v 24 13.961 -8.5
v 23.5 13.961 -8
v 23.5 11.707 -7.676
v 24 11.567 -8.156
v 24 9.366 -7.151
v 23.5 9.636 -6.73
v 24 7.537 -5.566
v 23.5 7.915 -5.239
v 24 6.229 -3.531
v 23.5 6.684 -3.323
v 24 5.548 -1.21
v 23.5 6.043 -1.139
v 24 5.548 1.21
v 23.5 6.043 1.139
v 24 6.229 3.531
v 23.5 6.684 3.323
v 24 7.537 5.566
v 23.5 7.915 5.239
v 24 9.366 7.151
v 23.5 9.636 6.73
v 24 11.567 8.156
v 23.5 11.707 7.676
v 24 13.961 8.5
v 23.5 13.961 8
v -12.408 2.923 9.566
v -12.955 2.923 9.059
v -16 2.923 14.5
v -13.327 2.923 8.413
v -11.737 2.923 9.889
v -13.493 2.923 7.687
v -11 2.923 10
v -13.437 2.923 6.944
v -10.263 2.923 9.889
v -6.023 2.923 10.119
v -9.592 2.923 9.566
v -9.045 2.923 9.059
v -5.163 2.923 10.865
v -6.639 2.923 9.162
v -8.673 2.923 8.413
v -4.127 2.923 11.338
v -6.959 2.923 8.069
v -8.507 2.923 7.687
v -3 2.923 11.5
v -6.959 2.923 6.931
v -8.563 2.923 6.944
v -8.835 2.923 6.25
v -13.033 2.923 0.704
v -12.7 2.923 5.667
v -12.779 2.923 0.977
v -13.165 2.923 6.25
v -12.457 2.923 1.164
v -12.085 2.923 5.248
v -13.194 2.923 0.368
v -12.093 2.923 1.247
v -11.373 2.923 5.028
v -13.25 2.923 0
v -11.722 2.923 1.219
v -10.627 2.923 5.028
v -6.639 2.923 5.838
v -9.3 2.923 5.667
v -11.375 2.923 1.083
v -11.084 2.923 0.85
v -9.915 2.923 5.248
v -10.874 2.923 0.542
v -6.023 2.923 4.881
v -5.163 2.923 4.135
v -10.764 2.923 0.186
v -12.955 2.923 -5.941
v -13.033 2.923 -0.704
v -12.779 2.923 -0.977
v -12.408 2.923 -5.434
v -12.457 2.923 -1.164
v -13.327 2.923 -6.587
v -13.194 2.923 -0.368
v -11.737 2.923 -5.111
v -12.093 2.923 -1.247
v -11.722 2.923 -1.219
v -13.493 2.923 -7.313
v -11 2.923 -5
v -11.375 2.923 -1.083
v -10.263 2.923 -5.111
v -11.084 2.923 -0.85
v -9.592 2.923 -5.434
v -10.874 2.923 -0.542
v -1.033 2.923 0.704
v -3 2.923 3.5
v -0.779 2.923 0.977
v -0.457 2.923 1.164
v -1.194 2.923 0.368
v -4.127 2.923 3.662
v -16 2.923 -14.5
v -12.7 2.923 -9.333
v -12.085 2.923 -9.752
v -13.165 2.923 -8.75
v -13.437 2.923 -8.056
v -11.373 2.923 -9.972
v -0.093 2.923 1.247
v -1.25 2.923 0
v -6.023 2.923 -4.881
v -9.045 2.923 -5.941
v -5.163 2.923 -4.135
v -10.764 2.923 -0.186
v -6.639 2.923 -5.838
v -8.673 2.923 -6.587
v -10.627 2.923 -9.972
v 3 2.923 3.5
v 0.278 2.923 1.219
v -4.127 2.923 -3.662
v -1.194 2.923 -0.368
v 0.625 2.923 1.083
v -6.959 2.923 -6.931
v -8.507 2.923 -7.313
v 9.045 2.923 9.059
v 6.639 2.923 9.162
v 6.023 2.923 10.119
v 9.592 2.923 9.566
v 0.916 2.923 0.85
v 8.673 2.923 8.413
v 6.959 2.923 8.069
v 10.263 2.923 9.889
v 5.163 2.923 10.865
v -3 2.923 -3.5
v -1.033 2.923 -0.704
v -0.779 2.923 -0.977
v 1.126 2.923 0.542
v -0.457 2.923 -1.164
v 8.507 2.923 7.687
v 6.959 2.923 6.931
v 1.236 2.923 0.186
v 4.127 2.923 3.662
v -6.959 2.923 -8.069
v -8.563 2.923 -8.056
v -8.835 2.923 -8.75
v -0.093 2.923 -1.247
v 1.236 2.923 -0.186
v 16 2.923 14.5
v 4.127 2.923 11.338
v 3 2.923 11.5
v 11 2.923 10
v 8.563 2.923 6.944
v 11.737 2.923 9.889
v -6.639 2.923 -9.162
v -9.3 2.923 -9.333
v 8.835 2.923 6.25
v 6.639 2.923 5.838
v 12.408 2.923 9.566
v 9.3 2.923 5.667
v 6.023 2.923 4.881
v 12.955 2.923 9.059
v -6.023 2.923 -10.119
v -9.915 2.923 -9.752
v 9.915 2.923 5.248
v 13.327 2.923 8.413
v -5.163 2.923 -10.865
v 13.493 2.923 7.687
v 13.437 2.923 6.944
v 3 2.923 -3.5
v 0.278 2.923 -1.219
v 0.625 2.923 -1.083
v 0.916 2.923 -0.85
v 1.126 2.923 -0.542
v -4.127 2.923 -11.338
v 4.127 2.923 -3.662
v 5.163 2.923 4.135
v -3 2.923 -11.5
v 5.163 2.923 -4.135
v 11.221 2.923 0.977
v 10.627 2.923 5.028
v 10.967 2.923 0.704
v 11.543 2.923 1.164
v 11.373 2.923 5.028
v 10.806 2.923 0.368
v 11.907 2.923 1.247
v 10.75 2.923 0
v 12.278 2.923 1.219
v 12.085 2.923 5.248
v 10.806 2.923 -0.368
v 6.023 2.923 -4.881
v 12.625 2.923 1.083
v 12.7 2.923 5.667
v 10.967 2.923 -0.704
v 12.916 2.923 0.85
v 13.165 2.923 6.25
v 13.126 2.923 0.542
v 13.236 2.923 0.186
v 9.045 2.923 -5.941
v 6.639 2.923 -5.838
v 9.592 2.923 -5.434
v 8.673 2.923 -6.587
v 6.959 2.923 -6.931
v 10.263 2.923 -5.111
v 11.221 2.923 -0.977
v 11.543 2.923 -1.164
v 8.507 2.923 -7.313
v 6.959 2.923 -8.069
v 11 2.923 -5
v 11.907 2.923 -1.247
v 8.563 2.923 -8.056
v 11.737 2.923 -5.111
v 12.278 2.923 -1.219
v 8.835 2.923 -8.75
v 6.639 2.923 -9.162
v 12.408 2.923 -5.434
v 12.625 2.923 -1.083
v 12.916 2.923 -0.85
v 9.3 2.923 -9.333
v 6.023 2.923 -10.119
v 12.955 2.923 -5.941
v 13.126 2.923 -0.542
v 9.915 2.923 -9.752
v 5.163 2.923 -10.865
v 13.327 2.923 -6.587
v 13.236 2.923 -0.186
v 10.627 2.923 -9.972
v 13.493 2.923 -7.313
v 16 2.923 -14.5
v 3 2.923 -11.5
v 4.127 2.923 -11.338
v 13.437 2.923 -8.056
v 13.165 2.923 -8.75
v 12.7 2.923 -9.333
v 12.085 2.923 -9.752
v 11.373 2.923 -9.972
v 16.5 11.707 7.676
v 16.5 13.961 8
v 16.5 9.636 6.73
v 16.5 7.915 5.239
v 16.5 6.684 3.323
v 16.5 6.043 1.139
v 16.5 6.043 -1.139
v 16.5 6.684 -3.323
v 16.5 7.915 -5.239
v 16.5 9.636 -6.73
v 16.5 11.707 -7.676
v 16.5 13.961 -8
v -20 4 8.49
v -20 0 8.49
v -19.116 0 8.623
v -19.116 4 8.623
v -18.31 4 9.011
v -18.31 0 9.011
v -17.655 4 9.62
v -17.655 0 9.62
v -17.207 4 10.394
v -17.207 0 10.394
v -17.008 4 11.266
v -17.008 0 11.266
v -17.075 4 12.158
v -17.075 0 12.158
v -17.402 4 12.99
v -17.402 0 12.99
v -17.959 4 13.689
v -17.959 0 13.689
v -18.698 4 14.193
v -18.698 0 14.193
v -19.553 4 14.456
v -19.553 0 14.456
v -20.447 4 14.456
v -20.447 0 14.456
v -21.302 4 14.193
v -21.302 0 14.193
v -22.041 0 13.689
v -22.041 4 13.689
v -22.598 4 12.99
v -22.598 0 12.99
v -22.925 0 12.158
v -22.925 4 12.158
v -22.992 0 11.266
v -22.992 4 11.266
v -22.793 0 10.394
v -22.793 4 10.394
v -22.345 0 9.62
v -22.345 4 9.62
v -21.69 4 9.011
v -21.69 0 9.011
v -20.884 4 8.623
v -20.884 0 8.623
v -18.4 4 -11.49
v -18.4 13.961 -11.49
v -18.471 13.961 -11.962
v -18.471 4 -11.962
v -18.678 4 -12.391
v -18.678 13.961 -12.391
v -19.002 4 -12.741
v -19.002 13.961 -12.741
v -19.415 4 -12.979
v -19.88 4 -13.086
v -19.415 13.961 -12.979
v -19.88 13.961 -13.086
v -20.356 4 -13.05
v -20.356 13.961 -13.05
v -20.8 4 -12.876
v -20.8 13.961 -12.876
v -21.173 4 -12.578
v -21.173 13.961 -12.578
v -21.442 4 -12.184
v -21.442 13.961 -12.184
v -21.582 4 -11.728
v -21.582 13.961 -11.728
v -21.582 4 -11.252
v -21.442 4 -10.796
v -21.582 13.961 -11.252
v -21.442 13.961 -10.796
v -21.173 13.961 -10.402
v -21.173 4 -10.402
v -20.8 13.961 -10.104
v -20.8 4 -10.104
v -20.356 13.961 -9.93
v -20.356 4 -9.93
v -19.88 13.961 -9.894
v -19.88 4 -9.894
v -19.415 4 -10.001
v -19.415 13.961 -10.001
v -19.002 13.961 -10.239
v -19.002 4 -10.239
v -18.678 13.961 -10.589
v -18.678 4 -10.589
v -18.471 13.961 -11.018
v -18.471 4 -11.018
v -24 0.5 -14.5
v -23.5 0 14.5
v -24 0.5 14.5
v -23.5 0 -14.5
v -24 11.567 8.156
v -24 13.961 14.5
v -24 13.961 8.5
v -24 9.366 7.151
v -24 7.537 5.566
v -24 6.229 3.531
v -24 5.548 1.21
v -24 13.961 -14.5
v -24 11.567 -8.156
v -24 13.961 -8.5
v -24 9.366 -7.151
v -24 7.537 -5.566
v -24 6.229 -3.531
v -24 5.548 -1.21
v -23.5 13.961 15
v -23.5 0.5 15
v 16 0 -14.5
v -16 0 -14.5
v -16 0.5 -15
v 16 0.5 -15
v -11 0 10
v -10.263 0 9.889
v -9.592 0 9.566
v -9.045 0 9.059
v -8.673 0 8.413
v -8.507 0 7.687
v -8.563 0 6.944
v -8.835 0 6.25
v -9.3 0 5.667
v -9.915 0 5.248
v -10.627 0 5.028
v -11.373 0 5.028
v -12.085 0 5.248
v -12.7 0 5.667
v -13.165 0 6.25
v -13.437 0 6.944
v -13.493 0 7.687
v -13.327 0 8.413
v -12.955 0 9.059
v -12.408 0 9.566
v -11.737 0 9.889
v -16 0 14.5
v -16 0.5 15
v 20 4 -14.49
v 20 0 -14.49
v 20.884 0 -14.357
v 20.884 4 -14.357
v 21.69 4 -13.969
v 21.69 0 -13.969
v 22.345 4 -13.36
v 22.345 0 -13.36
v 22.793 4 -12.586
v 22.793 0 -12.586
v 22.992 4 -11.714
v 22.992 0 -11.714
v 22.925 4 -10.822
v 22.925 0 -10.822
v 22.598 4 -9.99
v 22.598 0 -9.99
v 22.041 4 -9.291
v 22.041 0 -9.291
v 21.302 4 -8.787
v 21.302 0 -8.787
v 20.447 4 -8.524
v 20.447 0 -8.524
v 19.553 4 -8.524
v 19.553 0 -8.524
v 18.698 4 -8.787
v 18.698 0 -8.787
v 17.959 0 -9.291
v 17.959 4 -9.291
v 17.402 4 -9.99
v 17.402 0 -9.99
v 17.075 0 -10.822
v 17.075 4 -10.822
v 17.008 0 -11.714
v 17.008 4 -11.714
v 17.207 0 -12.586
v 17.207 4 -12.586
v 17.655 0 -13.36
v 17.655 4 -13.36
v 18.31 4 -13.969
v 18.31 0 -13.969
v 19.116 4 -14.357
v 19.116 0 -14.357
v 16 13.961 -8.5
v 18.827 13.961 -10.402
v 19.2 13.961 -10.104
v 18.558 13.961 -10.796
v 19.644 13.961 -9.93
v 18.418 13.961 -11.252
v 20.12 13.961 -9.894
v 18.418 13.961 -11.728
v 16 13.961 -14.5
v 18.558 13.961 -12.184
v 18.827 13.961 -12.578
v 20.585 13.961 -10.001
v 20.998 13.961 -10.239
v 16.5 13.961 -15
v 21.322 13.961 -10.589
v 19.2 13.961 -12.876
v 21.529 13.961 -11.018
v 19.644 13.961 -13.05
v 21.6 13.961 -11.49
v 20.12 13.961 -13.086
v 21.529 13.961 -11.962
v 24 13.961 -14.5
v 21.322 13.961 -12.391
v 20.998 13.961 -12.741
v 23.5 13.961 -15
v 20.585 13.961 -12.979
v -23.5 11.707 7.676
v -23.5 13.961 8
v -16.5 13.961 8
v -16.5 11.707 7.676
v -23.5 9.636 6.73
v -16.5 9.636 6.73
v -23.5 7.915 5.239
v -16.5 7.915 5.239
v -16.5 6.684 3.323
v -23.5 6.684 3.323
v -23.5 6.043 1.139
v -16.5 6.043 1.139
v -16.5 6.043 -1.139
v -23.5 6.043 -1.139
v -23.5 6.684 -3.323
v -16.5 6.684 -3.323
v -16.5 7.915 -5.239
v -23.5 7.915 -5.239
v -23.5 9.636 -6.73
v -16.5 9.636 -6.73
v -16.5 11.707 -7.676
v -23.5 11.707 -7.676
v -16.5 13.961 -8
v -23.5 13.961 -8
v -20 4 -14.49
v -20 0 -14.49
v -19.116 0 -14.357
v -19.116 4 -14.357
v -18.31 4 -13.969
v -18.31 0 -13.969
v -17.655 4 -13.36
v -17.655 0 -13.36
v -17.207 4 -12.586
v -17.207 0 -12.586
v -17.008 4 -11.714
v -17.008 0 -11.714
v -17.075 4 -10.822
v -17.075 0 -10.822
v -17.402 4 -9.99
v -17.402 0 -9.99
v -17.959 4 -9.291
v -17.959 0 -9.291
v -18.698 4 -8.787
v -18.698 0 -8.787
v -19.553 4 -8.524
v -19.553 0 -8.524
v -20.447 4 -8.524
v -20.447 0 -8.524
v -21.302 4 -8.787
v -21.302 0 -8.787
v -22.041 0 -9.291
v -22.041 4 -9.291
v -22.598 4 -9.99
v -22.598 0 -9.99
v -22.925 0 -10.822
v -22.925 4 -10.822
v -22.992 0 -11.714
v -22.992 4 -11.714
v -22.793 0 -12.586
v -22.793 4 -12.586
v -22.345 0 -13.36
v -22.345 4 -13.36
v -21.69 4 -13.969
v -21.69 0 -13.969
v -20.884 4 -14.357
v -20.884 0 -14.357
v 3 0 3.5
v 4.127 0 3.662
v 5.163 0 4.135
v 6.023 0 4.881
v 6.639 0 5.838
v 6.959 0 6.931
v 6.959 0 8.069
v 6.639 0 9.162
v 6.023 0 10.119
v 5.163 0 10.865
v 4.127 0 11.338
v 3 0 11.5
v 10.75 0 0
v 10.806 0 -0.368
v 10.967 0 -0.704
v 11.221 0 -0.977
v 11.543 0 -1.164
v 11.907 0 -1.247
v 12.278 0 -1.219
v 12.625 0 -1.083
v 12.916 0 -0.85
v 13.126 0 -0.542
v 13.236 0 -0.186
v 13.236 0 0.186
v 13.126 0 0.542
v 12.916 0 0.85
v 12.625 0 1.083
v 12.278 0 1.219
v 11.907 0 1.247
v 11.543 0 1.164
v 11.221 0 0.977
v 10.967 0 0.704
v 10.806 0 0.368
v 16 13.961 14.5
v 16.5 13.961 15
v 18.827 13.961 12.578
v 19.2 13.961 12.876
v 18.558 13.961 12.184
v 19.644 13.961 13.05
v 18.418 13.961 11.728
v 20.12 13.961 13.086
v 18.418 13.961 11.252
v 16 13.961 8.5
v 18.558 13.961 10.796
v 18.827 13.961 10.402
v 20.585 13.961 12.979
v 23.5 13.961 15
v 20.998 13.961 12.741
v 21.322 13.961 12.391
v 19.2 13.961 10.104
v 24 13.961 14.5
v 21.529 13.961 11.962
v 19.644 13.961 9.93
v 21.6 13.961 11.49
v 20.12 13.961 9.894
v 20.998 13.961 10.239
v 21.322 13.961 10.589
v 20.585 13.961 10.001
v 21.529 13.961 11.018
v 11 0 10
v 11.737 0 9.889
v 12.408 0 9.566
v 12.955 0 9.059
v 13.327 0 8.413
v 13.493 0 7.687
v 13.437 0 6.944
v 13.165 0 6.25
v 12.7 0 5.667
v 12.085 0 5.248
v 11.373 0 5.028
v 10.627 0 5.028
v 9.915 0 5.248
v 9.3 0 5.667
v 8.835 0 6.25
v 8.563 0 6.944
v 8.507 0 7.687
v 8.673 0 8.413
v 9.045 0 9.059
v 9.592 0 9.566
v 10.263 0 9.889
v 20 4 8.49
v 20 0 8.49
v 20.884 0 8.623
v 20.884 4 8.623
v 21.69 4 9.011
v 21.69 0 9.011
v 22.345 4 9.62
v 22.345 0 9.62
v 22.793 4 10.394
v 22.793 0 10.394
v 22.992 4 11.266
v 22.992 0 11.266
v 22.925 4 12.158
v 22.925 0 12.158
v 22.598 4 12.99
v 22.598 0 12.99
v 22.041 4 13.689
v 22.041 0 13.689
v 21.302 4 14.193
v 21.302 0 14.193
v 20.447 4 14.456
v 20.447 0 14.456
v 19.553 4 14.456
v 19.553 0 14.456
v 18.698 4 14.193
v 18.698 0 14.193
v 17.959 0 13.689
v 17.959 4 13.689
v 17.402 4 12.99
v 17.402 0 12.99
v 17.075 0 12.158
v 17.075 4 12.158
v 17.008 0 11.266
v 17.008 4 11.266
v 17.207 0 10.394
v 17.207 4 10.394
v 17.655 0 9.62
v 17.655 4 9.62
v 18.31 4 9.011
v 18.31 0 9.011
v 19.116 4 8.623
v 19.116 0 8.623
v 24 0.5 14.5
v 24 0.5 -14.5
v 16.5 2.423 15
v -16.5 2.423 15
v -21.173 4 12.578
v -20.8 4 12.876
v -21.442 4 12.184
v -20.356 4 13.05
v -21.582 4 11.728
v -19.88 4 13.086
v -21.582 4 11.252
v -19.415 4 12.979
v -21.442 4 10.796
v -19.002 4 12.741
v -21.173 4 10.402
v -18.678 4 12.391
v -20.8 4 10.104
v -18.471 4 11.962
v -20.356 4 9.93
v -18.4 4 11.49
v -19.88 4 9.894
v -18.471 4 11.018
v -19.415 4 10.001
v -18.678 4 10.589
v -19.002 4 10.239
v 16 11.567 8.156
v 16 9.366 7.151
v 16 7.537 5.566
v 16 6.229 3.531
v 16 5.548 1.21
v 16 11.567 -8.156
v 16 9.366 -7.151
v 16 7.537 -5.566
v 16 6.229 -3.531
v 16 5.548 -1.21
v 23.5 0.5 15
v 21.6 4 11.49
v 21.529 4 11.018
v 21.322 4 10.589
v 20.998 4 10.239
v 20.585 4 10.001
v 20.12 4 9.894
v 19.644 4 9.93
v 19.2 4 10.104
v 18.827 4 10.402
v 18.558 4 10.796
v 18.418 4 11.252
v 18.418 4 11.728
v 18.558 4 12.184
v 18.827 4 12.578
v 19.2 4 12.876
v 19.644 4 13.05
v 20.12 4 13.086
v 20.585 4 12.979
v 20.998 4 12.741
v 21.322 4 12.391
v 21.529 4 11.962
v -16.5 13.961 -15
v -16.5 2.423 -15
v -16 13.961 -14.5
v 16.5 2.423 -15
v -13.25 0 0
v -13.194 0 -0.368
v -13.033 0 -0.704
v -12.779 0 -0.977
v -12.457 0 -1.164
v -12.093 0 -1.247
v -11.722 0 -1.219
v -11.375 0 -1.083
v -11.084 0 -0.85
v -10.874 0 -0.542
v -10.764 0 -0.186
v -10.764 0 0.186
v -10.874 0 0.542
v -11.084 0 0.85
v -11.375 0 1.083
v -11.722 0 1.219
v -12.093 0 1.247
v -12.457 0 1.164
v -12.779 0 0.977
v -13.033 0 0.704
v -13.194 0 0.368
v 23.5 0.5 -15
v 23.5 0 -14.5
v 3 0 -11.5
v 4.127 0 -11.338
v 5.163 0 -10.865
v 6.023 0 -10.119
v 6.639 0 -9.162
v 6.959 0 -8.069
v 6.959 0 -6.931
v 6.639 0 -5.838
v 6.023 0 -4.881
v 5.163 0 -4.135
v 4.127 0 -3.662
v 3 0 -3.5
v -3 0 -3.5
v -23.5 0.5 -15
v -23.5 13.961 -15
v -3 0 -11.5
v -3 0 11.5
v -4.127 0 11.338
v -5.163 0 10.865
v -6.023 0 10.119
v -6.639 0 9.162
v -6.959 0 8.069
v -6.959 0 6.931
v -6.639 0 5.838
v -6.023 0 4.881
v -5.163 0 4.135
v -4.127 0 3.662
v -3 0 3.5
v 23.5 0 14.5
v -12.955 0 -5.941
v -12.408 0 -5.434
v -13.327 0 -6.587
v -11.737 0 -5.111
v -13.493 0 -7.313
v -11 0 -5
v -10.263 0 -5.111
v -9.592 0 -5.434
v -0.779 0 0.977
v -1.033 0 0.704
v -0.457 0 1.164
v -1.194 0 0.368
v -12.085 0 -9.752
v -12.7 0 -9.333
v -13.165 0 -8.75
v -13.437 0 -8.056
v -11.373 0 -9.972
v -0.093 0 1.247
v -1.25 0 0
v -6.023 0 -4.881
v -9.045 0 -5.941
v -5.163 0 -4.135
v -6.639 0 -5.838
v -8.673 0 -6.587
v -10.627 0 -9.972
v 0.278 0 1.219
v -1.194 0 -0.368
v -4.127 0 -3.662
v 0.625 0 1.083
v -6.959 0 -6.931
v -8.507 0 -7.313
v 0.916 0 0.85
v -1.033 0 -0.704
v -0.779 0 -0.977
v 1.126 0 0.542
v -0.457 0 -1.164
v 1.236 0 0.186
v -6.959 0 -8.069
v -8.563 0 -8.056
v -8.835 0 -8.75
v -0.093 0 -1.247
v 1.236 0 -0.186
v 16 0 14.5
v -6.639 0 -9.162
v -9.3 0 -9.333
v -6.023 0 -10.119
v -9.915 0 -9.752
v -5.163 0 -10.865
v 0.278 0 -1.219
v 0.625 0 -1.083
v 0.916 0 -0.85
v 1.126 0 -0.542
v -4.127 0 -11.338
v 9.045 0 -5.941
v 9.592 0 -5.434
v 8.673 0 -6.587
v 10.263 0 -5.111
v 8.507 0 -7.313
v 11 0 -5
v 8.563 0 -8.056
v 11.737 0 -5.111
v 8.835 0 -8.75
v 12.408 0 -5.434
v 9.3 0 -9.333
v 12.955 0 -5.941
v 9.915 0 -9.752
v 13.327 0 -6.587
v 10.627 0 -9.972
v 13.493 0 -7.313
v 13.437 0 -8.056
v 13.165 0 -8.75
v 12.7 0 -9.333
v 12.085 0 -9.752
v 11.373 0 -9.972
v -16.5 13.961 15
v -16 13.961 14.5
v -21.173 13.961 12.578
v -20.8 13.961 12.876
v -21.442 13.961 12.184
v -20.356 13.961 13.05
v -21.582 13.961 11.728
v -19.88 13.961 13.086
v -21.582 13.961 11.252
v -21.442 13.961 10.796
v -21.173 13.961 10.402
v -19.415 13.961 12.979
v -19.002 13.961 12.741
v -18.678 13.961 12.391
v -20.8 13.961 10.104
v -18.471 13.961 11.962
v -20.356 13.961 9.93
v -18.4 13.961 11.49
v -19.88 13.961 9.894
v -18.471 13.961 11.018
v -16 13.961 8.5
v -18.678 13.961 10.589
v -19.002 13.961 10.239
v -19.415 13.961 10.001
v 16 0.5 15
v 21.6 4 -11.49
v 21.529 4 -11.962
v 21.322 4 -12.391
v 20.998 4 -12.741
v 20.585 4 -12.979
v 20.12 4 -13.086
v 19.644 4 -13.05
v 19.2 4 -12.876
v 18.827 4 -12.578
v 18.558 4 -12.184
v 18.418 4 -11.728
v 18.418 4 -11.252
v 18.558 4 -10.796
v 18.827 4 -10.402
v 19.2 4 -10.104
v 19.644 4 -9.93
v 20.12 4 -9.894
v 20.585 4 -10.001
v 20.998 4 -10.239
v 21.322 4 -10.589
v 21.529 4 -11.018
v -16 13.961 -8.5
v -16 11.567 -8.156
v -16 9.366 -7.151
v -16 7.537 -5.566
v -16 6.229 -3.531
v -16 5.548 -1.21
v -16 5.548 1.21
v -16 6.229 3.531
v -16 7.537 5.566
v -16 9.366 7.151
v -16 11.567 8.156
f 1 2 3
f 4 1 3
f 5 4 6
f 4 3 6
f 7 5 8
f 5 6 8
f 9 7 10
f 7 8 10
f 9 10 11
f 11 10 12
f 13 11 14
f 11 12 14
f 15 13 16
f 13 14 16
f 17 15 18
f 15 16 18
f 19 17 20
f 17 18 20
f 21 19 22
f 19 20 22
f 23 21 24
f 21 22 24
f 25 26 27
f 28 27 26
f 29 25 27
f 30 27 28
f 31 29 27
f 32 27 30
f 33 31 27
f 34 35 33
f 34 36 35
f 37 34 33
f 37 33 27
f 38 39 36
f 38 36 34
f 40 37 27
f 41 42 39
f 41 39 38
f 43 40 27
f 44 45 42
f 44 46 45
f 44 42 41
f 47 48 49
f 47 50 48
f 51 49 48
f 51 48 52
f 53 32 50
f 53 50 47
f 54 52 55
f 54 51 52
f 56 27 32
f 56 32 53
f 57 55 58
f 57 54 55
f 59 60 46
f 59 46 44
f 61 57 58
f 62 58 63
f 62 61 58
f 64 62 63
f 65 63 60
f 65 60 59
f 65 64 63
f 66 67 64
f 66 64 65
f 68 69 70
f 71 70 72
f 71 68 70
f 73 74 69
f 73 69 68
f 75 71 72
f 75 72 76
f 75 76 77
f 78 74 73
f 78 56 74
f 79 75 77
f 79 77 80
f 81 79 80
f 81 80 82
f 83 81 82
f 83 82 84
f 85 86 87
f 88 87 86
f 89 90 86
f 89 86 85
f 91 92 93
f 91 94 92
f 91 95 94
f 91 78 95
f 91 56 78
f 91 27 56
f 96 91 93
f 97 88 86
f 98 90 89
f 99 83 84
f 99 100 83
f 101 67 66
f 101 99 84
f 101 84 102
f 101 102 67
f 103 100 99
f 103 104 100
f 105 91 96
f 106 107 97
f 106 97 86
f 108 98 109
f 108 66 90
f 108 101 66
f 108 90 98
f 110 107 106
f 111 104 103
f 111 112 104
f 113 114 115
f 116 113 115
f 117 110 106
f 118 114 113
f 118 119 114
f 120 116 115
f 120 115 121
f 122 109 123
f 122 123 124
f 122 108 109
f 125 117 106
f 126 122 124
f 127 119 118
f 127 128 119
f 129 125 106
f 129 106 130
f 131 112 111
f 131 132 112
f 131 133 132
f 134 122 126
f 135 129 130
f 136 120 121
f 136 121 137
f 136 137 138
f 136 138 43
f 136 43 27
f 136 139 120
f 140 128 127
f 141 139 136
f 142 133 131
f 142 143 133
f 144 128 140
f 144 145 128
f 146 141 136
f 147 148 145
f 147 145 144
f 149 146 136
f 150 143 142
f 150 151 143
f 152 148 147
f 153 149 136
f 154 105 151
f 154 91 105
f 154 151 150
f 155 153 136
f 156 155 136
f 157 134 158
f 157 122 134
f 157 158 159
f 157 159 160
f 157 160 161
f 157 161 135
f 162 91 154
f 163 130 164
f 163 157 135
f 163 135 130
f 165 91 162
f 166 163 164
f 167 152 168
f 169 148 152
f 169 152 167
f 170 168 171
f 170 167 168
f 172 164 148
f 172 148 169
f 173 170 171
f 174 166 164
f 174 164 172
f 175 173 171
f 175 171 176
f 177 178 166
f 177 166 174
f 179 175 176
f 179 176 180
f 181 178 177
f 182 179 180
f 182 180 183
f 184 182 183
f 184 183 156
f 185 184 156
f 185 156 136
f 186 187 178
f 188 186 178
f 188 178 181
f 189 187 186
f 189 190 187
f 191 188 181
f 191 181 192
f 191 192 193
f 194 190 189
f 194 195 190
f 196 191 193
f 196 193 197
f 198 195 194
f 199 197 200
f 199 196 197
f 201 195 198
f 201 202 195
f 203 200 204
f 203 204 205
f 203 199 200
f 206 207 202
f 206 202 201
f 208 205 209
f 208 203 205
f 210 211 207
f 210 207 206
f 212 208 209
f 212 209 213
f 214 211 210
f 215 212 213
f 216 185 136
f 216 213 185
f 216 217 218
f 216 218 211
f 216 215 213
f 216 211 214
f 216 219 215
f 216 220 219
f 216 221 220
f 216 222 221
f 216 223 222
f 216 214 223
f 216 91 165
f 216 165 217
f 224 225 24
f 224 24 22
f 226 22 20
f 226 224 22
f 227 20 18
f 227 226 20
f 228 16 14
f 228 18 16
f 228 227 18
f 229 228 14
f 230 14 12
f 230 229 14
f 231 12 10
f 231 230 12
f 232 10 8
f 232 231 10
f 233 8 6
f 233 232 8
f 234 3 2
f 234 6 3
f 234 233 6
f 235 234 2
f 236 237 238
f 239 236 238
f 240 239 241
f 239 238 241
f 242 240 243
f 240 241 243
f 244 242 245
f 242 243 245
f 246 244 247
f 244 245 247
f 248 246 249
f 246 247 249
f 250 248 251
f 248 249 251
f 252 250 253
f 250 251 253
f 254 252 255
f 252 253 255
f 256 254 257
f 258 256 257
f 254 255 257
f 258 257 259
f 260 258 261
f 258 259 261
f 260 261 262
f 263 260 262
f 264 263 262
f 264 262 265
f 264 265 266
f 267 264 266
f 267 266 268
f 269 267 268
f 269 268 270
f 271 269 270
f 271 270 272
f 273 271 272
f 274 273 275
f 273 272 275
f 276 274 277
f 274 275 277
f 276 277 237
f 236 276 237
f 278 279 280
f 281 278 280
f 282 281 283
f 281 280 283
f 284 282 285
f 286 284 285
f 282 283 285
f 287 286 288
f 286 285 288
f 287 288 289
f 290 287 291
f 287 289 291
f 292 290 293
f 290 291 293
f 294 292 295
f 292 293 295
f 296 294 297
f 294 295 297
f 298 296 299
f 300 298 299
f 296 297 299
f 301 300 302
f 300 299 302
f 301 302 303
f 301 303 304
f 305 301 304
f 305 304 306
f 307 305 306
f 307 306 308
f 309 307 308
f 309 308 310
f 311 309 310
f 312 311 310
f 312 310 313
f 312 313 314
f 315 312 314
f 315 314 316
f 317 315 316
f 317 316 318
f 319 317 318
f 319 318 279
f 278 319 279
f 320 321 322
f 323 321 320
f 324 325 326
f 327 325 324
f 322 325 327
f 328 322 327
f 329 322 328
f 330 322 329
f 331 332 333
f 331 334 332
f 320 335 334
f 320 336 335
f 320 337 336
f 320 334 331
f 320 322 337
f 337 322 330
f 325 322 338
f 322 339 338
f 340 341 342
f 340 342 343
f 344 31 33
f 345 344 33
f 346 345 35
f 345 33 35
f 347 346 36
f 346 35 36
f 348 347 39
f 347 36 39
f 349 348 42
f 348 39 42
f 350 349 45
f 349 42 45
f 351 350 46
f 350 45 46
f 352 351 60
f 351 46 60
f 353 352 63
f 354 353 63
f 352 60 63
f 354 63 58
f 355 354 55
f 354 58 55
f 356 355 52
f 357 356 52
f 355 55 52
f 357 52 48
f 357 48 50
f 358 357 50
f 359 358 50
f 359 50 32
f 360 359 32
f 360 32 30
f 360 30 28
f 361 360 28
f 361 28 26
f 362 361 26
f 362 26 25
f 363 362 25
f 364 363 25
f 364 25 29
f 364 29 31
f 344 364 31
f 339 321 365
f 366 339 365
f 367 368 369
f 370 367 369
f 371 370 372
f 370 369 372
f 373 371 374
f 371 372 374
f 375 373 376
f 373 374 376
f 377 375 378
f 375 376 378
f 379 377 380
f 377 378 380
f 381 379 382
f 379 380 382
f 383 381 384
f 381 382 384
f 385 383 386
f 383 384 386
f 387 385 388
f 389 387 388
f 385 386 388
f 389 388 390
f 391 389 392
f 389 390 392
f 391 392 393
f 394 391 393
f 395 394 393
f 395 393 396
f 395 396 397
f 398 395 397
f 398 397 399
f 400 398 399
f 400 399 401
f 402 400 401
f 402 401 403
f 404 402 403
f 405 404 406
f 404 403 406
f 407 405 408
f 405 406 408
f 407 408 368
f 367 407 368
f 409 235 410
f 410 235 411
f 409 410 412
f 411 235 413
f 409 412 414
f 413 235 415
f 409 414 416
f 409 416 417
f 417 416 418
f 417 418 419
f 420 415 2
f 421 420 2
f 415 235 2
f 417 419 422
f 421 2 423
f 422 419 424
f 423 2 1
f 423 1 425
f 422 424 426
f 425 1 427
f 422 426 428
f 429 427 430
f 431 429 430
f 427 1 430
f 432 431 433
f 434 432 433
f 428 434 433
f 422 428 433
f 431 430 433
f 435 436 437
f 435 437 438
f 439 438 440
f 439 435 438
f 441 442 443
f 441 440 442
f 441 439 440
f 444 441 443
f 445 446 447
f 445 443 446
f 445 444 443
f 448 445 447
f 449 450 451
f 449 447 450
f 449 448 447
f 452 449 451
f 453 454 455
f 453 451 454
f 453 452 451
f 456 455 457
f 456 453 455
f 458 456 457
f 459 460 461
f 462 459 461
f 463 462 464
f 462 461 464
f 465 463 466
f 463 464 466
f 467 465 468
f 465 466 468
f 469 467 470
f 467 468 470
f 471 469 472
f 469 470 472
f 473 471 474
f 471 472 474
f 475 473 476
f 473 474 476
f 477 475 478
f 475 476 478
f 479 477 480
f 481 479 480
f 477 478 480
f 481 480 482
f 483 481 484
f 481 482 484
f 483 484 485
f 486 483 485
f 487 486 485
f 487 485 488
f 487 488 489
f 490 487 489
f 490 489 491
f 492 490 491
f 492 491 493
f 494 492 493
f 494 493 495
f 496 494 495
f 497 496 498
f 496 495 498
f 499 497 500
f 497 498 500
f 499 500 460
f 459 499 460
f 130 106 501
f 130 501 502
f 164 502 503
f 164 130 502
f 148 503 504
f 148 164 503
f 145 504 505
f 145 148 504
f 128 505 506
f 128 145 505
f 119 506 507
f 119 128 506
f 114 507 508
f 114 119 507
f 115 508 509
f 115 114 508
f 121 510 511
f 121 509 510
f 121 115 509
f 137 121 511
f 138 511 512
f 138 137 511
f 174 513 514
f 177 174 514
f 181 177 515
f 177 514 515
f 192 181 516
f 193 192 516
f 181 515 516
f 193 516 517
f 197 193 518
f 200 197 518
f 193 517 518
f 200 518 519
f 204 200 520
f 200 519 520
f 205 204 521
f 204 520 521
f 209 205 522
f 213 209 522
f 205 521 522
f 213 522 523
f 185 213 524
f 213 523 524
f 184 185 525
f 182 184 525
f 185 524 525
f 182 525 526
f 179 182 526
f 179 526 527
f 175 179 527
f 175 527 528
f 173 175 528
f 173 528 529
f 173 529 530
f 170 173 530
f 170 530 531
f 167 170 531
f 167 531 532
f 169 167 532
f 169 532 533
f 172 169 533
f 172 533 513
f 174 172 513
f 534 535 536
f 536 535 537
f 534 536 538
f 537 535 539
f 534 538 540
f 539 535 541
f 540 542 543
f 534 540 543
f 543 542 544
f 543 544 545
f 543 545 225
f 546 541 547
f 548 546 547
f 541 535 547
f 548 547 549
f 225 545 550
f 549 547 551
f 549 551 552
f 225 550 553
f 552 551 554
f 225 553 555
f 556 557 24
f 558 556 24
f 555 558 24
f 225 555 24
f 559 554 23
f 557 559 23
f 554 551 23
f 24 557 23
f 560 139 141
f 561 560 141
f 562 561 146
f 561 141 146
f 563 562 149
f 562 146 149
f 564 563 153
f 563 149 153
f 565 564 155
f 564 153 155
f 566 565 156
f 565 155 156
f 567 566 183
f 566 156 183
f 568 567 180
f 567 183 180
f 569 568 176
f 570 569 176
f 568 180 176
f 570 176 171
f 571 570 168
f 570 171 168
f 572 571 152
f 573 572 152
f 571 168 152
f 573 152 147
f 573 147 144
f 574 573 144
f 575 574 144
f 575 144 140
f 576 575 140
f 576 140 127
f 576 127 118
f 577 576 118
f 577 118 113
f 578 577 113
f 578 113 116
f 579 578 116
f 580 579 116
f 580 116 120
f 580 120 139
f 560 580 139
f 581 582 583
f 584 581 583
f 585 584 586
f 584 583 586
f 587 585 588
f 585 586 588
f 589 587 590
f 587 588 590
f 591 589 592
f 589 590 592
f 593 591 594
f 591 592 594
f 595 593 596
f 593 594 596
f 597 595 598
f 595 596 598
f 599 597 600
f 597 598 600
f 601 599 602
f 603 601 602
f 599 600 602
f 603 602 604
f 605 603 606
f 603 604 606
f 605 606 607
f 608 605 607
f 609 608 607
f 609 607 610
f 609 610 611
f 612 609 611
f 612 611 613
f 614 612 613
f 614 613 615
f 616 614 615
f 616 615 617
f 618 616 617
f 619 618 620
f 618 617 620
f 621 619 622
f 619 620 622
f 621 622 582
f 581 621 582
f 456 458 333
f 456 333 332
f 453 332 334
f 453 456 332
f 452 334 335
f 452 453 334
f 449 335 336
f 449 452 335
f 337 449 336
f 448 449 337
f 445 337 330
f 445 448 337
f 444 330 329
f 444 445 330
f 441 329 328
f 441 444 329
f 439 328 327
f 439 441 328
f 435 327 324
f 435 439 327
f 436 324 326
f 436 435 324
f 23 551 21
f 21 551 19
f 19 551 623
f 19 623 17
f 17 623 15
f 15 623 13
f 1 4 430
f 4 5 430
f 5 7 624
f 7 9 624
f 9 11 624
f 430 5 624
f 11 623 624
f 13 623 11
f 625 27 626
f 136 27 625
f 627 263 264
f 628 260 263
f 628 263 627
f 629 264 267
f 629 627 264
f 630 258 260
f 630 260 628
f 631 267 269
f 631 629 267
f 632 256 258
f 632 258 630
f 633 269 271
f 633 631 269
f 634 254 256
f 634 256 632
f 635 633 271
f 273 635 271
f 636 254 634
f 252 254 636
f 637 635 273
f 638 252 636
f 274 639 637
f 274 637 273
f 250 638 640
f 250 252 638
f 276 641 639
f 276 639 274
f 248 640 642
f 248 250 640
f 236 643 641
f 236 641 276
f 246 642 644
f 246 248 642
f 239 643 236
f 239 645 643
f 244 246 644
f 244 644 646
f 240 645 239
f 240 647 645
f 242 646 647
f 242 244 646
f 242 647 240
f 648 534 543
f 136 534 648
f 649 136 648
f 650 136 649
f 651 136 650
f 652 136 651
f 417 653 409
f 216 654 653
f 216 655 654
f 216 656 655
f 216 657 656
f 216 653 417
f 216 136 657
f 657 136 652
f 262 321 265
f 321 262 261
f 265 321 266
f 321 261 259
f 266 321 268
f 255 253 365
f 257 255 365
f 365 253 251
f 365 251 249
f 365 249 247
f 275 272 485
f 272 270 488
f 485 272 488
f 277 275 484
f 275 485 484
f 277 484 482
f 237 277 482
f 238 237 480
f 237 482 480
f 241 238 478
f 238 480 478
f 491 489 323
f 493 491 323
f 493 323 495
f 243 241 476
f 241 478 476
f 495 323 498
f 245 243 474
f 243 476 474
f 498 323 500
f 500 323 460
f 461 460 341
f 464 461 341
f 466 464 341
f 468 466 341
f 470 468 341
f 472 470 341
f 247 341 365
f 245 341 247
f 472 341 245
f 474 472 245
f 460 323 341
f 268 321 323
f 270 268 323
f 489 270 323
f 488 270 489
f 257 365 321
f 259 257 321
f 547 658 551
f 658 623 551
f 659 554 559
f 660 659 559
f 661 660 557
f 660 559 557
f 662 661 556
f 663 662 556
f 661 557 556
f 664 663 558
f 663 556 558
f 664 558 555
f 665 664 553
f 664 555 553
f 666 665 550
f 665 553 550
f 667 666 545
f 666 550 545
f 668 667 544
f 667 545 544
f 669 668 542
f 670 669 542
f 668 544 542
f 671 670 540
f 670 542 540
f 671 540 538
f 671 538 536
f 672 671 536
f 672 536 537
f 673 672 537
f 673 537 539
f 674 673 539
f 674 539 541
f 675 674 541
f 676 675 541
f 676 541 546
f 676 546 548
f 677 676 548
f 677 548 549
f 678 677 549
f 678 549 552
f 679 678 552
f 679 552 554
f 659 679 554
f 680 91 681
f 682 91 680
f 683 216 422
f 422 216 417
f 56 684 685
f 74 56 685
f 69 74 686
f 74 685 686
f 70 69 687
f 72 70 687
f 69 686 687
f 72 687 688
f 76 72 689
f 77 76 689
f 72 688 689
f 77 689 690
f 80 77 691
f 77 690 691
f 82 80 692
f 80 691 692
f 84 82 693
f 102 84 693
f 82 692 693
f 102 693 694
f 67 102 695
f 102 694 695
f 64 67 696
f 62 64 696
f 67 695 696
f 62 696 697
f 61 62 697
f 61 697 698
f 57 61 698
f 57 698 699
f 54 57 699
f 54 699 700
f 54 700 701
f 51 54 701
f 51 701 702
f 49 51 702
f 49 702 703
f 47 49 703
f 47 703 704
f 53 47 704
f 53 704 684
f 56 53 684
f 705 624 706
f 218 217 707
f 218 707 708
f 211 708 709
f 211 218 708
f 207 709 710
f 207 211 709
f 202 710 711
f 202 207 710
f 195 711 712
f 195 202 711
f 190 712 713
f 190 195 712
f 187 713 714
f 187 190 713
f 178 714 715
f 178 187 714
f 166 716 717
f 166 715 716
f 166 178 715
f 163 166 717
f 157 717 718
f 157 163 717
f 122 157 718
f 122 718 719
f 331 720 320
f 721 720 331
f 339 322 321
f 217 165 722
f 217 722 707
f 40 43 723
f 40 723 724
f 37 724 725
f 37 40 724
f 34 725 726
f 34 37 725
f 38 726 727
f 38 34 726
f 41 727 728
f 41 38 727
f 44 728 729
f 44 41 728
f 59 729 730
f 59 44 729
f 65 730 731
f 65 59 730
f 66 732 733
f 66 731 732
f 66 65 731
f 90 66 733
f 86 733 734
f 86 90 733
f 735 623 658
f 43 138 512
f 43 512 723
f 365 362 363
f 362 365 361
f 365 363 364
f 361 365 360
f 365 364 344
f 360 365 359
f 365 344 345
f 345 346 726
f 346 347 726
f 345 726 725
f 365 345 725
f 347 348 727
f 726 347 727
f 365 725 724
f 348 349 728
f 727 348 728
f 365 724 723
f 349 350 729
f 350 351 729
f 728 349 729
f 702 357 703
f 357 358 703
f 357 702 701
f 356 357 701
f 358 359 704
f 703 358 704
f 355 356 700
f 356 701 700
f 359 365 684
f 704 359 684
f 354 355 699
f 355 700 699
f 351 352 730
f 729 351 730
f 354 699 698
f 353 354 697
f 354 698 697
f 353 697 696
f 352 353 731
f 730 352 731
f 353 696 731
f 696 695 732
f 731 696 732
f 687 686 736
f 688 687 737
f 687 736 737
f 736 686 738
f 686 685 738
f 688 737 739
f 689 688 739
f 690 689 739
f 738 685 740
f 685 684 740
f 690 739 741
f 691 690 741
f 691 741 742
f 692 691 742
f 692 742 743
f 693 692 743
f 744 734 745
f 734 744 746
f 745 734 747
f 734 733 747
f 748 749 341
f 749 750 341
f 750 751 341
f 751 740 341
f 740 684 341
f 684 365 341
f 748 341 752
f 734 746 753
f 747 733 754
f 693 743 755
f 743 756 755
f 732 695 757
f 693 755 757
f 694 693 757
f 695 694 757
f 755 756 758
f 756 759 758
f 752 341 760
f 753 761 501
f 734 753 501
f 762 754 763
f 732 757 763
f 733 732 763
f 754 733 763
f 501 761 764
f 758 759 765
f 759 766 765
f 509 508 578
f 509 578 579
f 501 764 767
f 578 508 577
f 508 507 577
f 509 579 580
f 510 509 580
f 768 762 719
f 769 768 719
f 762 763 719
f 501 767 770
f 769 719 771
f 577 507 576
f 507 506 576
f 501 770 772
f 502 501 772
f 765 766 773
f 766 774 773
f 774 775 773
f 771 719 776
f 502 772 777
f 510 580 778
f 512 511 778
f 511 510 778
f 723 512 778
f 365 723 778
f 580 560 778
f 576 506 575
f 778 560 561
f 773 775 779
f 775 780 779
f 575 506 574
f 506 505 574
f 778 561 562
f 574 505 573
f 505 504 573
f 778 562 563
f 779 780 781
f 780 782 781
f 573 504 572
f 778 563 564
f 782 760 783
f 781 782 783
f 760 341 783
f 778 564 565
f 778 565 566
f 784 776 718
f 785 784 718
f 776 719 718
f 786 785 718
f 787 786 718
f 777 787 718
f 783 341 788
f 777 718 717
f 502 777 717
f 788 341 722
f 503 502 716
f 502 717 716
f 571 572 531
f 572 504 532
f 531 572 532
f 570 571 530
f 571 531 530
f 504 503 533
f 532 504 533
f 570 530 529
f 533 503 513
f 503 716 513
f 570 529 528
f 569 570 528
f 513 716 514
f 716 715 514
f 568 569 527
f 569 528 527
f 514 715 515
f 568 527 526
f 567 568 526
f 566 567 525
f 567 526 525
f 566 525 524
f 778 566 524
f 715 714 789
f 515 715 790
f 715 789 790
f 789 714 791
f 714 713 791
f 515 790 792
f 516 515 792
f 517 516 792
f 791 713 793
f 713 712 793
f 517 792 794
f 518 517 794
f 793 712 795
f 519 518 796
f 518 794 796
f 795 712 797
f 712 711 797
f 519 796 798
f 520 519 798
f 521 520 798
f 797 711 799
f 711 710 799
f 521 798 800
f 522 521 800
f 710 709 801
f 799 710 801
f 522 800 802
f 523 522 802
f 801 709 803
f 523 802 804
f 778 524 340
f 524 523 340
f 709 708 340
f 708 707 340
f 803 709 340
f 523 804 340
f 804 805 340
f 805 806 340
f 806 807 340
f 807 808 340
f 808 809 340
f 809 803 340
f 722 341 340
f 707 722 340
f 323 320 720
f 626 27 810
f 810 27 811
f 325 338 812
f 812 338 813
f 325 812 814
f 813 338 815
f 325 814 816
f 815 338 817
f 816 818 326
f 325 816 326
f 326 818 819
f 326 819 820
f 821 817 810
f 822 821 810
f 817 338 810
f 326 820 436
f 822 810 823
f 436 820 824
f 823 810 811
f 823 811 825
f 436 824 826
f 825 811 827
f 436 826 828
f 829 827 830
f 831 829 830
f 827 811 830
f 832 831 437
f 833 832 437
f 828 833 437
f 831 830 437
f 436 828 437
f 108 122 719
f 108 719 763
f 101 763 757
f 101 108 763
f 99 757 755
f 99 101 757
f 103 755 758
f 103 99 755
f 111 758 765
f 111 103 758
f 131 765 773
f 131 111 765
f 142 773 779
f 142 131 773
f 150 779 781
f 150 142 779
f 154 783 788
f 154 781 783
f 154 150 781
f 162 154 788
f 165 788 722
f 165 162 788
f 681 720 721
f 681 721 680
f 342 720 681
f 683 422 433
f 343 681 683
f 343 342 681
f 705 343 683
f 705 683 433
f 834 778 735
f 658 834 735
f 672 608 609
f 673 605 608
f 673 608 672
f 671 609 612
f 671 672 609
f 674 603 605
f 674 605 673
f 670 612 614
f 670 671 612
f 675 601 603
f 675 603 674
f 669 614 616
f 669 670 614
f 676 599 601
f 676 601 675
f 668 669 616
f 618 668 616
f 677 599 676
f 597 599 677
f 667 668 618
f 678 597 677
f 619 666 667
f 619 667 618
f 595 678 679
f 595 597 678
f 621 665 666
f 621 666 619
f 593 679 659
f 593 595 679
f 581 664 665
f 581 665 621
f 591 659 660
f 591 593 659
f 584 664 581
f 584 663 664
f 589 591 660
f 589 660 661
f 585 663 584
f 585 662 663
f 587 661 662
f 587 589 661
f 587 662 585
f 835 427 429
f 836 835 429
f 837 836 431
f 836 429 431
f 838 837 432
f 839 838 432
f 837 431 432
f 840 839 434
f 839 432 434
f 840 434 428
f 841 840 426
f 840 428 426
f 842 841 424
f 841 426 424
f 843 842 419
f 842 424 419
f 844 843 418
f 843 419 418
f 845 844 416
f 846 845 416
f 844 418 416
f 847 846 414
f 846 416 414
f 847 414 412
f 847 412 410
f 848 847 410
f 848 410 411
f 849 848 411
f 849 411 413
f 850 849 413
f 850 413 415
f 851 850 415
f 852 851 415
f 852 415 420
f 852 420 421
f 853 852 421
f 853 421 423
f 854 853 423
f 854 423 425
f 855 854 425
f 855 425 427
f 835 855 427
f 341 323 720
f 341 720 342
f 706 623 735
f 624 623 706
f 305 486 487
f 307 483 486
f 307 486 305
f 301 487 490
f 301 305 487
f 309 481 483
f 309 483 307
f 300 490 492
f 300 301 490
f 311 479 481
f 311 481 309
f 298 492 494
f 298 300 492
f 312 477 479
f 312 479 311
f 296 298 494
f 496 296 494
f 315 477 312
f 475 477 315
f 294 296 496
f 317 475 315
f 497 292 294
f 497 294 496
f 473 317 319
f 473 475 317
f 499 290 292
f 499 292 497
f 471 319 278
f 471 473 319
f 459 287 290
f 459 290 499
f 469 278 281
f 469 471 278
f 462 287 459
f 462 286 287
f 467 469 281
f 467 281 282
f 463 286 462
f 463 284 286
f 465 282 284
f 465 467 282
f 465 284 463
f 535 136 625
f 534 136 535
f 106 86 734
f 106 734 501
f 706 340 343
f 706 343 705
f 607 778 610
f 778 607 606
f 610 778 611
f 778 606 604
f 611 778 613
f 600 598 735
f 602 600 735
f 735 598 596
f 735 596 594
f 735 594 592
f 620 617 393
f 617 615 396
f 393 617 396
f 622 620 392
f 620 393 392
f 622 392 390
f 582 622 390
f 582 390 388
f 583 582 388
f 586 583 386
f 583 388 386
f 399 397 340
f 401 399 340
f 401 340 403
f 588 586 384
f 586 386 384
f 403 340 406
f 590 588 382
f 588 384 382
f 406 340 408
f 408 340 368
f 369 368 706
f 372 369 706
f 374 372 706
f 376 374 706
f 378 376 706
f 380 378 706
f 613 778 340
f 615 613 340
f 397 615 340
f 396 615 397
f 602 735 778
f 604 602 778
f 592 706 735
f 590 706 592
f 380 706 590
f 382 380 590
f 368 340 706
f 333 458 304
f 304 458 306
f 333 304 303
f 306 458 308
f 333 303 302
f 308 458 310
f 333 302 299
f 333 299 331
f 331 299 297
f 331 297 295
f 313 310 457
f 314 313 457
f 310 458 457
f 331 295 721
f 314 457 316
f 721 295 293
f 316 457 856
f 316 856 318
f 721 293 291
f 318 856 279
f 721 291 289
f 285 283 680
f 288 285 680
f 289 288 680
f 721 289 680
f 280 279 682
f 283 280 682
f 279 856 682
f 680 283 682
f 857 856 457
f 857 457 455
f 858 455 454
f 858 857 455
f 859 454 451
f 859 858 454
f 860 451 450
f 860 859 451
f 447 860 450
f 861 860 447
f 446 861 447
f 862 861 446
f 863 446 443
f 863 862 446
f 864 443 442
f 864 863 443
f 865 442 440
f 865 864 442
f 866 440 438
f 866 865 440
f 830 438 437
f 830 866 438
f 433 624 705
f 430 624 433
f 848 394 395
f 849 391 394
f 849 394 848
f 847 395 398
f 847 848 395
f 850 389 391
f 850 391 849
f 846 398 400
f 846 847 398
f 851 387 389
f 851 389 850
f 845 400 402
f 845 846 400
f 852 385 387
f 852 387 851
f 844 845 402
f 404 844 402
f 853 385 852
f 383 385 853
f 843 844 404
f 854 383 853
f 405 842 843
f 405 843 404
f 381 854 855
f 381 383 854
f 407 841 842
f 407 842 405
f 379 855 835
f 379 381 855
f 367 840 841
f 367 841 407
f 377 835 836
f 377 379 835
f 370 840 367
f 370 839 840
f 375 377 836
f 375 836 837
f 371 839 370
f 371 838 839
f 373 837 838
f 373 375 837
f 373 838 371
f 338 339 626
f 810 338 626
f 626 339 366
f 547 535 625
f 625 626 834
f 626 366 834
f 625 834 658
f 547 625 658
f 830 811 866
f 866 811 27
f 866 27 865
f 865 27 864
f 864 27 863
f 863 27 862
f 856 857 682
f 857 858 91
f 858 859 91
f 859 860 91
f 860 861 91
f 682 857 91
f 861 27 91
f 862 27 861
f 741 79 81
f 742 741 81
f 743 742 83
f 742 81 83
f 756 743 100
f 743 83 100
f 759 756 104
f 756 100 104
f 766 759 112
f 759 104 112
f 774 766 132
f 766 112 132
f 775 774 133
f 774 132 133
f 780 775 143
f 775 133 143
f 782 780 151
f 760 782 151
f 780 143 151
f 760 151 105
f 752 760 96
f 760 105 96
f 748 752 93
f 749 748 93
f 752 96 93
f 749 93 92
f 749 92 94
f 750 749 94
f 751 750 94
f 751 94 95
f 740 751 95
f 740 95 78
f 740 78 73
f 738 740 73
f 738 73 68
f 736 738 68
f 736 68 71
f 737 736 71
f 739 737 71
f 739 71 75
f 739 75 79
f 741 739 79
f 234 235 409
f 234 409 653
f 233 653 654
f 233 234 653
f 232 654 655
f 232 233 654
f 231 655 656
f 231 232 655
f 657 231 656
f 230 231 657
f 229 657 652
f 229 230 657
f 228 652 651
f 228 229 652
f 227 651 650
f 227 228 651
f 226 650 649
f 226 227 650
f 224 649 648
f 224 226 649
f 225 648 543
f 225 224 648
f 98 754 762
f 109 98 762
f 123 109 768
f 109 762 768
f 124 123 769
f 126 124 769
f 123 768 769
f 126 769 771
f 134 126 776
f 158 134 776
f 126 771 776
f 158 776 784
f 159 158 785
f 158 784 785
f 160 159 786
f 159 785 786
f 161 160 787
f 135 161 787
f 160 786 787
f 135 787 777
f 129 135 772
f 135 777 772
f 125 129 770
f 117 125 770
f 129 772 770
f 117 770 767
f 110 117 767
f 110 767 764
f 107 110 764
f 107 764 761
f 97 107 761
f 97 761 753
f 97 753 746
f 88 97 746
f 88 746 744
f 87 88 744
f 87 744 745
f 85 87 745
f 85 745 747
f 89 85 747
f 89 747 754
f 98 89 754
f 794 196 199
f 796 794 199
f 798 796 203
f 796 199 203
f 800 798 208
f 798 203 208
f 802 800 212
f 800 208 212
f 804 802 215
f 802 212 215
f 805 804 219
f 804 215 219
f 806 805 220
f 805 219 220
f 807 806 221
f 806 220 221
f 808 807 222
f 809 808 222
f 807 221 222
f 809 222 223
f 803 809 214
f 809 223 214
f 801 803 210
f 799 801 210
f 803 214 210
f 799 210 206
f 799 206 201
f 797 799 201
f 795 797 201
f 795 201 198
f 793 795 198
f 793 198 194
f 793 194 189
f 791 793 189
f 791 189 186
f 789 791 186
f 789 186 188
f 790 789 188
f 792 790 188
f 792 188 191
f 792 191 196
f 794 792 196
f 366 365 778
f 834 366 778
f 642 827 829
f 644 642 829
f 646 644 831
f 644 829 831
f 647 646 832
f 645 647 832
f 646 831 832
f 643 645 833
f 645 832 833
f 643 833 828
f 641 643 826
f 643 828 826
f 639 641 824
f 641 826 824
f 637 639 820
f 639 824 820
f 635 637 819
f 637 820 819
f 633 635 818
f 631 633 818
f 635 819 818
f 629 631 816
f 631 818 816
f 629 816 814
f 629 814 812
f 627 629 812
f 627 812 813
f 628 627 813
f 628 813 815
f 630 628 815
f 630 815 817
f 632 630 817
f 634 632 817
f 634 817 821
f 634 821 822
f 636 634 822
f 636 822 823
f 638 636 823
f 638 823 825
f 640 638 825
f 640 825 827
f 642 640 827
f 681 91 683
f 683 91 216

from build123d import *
from build123d.topology import SkipClean

# Parameters (mm, degrees)
SKETCH2_W                = 32
SKETCH2_H                = 30
BOSS_EXTRUDE1_DEPTH      = 2.922658801
BOSS_EXTRUDE2_DEPTH      = 25
BOSS_EXTRUDE2_DEPTH_BACK = 2.922659
SKETCH3_W                = 8
SKETCH3_H                = 30
CUT_EXTRUDE1_DEPTH       = 58.521082001
CUT_EXTRUDE1_DEPTH_BACK  = 58.521082001
SKETCH4_R                = 8
M3X0_5_TAPPED_HOLE1_D    = 2.5
SKETCH7_R                = 2.5
CUT_EXTRUDE2_DEPTH       = 38.762415177
SKETCH8_W                = 30
SKETCH8_H                = 18.9613294
CUT_EXTRUDE3_DEPTH       = 58.521082001
M3_CLEARANCE_HOLE1_D     = 3.2
CHAMFER1_SIZE            = 0.5
SKETCH13_R               = 3
CUT_EXTRUDE4_DEPTH       = 4


with BuildPart() as part:
    # Sketch2 → Boss-Extrude1 (new body)
    with BuildSketch(Plane(origin=(0, 0, 0), x_dir=(1, 0, 0), z_dir=(0, 1, 0))):
        Rectangle(SKETCH2_W, SKETCH2_H)
    extrude(amount=BOSS_EXTRUDE1_DEPTH)

    # Sketch3 → Boss-Extrude2 (add, two sides: drawn at the far end of the back side and taken through both)
    with BuildSketch(Plane(origin=(0, 2.922658801, 0), x_dir=(1, 0, 0), z_dir=(0, 1, 0)).offset(-BOSS_EXTRUDE2_DEPTH_BACK)):
        with Locations((-20, 0)):
            Rectangle(SKETCH3_W, SKETCH3_H)
        with Locations((20, 0)):
            Rectangle(SKETCH3_W, SKETCH3_H)
    extrude(amount=BOSS_EXTRUDE2_DEPTH + BOSS_EXTRUDE2_DEPTH_BACK)

    # Sketch4 → Cut-Extrude1 (cut, two sides: drawn at the far end of the back side and taken through both)
    with BuildSketch(Plane(origin=(24, 0, 0), x_dir=(0, 0, -1), z_dir=(1, 0, 0)).offset(-CUT_EXTRUDE1_DEPTH_BACK)):
        with Locations((0, 13.961329401)):
            Circle(SKETCH4_R)
    extrude(amount=CUT_EXTRUDE1_DEPTH + CUT_EXTRUDE1_DEPTH_BACK, mode=Mode.SUBTRACT)

    # M3x0.5 Tapped Hole1 (through all)
    with Locations(Plane(origin=(0, 2.922658801, 0), x_dir=(1, 0, 0), z_dir=(0, 1, 0))):
        with Locations((12, 0), (0, 0), (-12, 0)):
            Hole(M3X0_5_TAPPED_HOLE1_D / 2)

    # Sketch7 → Cut-Extrude2 (cut, through all)
    with BuildSketch(Plane(origin=(0, 2.922658801, 0), x_dir=(1, 0, 0), z_dir=(0, 1, 0))):
        with Locations(Location((-11, 7.5, 0), (0, 0, 270))):
            Circle(SKETCH7_R)
        with Locations(Location((-11, -7.5, 0), (0, 0, 270))):
            Circle(SKETCH7_R)
        with Locations(Location((11, -7.5, 0), (0, 0, 270))):
            Circle(SKETCH7_R)
        with Locations(Location((11, 7.5, 0), (0, 0, 270))):
            Circle(SKETCH7_R)
        with BuildLine():
            Line((-3, 11.5), (3, 11.5))
            ThreePointArc((3, 11.5), (7, 7.5), (3, 3.5))
            Line((3, 3.5), (-3, 3.5))
            ThreePointArc((-3, 3.5), (-7, 7.5), (-3, 11.5))
        make_face()
        with BuildLine():
            Line((-3, -3.5), (3, -3.5))
            ThreePointArc((3, -3.5), (7, -7.5), (3, -11.5))
            Line((3, -11.5), (-3, -11.5))
            ThreePointArc((-3, -11.5), (-7, -7.5), (-3, -3.5))
        make_face()
    extrude(amount=-CUT_EXTRUDE2_DEPTH, mode=Mode.SUBTRACT)

    # Sketch8 → Cut-Extrude3 (cut, through all)
    with BuildSketch(Plane(origin=(24, 0, 0), x_dir=(0, 0, -1), z_dir=(1, 0, 0))):
        with Locations((0, 23.441994101)):
            Rectangle(SKETCH8_W, SKETCH8_H)
    extrude(amount=-CUT_EXTRUDE3_DEPTH, mode=Mode.SUBTRACT)

    # M3 Clearance Hole1 (through all)
    with Locations(Plane(origin=(0, 0, 0), x_dir=(-1, 0, 0), z_dir=(0, -1, 0))):
        with Locations((-20, 11.49), (20, -11.49), (-20, -11.49), (20, 11.49)):
            Hole(M3_CLEARANCE_HOLE1_D / 2)

    # Chamfer1
    chamfer1_edges = [part.edges().sort_by_distance(p)[0] for p in [
        (-16, 5.961329401, 0),
        (-24, 5.961329401, 0),
        (16, 5.961329401, 0),
        (24, 5.961329401, 0),
        (-16, 8.441994101, -15),
        (-16, 8.441994101, 15),
        (-24, 6.980664601, 15),
        (-24, 6.980664601, -15),
        (-24, -1.99e-07, 0),
        (0, 2.922658801, -15),
        (16, 8.441994101, 15),
        (16, 8.441994101, -15),
        (24, 6.980664601, -15),
        (24, 6.980664601, 15),
        (24, -1.99e-07, 0),
        (0, 0, -15),
        (0, 0, 15),
        (0, 2.922658801, 15),
    ]]
    chamfer(chamfer1_edges, length=CHAMFER1_SIZE)

    # Sketch13 → Cut-Extrude4 (cut)
    with SkipClean():  # the faces are left unmerged after this step: merging them gives an invalid solid
        with BuildSketch(Plane.XZ):
            with Locations(Location((20, -11.49, 0), (0, 0, 270))):
                Circle(SKETCH13_R)
            with Locations(Location((-20, -11.49, 0), (0, 0, 270))):
                Circle(SKETCH13_R)
            with Locations(Location((-20, 11.49, 0), (0, 0, 270))):
                Circle(SKETCH13_R)
            with Locations(Location((20, 11.49, 0), (0, 0, 270))):
                Circle(SKETCH13_R)
        extrude(amount=-CUT_EXTRUDE4_DEPTH, mode=Mode.SUBTRACT)


solid = part.part
